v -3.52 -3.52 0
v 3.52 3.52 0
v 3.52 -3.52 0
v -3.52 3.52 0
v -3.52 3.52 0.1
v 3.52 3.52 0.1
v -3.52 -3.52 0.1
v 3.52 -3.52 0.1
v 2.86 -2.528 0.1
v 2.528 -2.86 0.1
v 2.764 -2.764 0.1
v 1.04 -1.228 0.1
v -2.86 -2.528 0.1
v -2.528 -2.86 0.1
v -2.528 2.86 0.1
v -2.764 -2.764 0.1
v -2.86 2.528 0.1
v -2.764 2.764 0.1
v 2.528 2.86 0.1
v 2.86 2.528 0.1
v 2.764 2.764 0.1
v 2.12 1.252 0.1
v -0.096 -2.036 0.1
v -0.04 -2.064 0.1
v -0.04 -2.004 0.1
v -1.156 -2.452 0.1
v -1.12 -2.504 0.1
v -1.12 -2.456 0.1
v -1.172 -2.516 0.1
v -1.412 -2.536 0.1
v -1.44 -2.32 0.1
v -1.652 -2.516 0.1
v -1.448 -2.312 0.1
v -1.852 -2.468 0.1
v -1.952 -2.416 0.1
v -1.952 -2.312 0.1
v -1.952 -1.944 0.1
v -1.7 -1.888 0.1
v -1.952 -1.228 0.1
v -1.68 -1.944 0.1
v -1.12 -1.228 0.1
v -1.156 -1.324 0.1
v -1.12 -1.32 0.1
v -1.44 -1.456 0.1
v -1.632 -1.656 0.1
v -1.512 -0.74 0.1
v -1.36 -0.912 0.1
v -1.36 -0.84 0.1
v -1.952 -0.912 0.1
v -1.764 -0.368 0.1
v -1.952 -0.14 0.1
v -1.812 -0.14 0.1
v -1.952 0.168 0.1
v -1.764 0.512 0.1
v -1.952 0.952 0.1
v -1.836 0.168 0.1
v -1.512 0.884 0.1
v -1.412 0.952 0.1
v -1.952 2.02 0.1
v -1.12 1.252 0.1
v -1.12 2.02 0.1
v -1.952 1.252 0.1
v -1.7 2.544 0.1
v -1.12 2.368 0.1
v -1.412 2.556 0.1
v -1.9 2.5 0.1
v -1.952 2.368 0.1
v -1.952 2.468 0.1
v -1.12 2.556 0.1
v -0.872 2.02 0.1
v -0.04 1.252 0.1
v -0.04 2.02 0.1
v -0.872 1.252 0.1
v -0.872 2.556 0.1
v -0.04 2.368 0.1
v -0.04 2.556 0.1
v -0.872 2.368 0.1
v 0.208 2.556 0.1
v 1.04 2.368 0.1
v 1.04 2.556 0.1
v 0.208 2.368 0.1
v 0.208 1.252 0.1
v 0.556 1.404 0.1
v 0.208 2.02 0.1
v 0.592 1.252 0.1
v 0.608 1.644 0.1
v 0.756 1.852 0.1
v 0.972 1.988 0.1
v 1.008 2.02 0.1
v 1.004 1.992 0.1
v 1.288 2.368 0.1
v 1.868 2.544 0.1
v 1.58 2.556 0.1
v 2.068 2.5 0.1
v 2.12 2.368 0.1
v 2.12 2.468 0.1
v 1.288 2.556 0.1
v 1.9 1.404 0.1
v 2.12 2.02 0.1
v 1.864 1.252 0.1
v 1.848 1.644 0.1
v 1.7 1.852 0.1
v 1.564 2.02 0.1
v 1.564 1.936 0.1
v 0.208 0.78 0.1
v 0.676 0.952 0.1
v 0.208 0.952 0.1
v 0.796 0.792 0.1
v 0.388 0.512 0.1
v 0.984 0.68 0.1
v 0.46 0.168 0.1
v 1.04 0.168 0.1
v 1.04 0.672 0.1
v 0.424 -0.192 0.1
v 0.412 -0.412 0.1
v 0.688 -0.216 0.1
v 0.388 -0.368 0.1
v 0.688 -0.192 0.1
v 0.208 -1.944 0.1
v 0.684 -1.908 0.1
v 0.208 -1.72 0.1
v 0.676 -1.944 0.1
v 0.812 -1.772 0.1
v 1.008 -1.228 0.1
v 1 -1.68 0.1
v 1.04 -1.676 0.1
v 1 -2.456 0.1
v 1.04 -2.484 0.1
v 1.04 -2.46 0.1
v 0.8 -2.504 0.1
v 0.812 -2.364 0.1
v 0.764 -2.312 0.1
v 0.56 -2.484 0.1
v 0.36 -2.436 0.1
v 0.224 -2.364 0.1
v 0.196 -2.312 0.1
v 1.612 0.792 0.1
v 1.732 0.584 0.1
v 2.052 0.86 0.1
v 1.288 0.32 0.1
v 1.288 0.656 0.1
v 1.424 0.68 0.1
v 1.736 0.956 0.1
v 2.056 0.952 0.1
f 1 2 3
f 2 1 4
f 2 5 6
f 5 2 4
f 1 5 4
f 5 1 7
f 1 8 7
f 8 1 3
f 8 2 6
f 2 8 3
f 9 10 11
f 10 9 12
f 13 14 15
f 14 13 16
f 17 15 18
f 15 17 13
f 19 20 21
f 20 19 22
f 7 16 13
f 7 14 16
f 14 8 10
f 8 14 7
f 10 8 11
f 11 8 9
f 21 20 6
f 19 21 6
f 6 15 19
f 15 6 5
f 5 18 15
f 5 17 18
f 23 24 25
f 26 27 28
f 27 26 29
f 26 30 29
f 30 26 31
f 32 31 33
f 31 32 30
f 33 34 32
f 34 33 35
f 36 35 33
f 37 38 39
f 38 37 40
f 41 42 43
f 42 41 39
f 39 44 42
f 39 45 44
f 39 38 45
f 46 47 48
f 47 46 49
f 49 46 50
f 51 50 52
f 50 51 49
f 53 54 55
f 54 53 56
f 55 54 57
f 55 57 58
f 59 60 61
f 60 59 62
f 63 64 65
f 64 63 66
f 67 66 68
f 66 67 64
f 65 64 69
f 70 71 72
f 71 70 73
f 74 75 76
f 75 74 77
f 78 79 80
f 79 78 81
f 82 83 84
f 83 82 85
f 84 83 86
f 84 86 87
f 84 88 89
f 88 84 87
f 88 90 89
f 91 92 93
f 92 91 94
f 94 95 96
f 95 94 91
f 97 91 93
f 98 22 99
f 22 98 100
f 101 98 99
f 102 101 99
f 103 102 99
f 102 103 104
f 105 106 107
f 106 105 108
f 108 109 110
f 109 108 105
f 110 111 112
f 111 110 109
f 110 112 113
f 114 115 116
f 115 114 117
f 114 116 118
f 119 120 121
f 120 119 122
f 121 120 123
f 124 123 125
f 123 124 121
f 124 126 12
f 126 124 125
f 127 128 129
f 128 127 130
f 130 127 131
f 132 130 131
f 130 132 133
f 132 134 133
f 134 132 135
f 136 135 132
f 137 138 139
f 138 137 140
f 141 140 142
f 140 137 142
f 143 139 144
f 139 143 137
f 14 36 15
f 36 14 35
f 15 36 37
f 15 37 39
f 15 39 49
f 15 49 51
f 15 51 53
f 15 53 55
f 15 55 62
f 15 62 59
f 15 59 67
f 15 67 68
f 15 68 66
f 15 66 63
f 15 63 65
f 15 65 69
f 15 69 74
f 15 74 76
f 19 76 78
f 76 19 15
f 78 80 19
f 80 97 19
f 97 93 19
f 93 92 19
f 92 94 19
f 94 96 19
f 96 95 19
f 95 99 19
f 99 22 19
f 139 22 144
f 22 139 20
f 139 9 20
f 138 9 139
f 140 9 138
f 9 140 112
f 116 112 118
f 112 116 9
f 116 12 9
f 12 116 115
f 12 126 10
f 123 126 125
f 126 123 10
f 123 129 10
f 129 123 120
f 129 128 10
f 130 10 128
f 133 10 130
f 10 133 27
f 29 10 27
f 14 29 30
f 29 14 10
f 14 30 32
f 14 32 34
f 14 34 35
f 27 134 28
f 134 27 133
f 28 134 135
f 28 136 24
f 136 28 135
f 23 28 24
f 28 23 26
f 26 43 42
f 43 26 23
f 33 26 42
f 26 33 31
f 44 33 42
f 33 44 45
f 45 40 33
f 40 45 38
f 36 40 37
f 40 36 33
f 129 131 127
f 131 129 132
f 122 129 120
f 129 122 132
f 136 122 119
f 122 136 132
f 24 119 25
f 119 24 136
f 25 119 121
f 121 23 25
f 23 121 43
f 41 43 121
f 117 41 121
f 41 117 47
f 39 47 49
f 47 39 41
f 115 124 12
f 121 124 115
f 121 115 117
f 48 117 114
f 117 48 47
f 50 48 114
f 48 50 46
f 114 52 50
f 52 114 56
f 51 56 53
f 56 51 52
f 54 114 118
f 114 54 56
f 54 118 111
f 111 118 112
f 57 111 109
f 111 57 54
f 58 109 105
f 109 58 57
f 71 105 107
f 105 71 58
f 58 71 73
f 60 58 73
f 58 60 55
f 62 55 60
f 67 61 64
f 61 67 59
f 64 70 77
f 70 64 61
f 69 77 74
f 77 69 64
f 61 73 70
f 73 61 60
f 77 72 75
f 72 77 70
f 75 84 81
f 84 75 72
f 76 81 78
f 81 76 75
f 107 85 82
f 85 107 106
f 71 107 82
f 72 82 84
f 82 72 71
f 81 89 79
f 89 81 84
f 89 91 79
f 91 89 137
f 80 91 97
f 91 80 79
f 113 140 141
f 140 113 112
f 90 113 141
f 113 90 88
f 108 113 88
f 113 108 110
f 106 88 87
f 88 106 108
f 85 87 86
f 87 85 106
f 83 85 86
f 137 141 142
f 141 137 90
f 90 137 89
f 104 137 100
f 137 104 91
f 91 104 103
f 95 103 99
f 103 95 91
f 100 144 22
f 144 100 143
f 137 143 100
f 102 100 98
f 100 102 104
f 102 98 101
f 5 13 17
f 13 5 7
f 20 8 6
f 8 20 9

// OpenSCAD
// file: ../p/box5-12.scad
use <../lib.scad>
function ldraw_lib__box5_12() = [
// 0 Box with 5 Faces without Any Edges
// 0 Name: box5-12.dat
// 0 Author: Chris Dee [cwdee]
// 0 !LDRAW_ORG Primitive UPDATE 2009-02
// 0 !LICENSE Licensed under CC BY 4.0 : see CAreadme.txt
// 
// 0 BFC CERTIFY CCW
  [0,"BFC","CERTIFY"],
  [0,"BFC","CCW"],
// 
// 0 !HISTORY 2009-09-03 [PTadmin] Official Update 2009-02
// 
// 
// 4 16 1 1 1 1 1 -1 -1 1 -1 -1 1 1
  [4,16,1,1,1,1,1,-1,-1,1,-1,-1,1,1],
// 4 16 -1 0 1 1 0 1 1 1 1 -1 1 1
  [4,16,-1,0,1,1,0,1,1,1,1,-1,1,1],
// 4 16 -1 0 -1 -1 0 1 -1 1 1 -1 1 -1
  [4,16,-1,0,-1,-1,0,1,-1,1,1,-1,1,-1],
// 4 16 1 0 -1 -1 0 -1 -1 1 -1 1 1 -1
  [4,16,1,0,-1,-1,0,-1,-1,1,-1,1,1,-1],
// 4 16 1 0 1 1 0 -1 1 1 -1 1 1 1
  [4,16,1,0,1,1,0,-1,1,1,-1,1,1,1],
// 0
];
module ldraw_lib__box5_12(step=0, col=false, unit=2/5, alt=false, line=0.2, solid=!$preview)
    makepoly(ldraw_lib__box5_12(), step=step, col=col, unit=unit, alt=alt, line=line, solid=solid);
ldraw_lib__box5_12(line=0.2);
// main file
use <../lib.scad>
use <../p/box5-12.scad>
function ldraw_lib__168365d() = [
// 0 Sticker  0.9 x  0.9 with Light Grey Stripes on White Background with Reflection Areas with Black Border
// 0 Name: 168365d.dat
// 0 Author: Max Martin Richter [MMR1988]
// 0 !LDRAW_ORG Part UPDATE 2019-02
// 0 !LICENSE Licensed under CC BY 4.0 : see CAreadme.txt
// 
// 0 BFC CERTIFY CCW
  [0,"BFC","CERTIFY"],
  [0,"BFC","CCW"],
// 
// 0 !KEYWORDS headlight, Set 8858-1
// 
// 0 !HISTORY 2019-09-09 [PTadmin] Official Update 2019-02
// 
// 
// 1 16 0 -0.25 0 8.8 0 0 0 0.25 0 0 0 8.8 box5-12.dat
  [1,16,0,-0.25,0,8.8,0,0,0,0.25,0,0,0,8.8, ldraw_lib__box5_12()],
// 
// 4 15 6.32 -0.25 -7.15 6.91 -0.25 -6.91 7.15 -0.25 -6.32 2.6 -0.25 -3.07
  [4,15,6.32,-0.25,-7.15,6.91,-0.25,-6.91,7.15,-0.25,-6.32,2.6,-0.25,-3.07],
// 4 15 -7.15 -0.25 -6.32 -6.91 -0.25 -6.91 -6.32 -0.25 -7.15 -6.32 -0.25 7.15
  [4,15,-7.15,-0.25,-6.32,-6.91,-0.25,-6.91,-6.32,-0.25,-7.15,-6.32,-0.25,7.15],
// 4 15 -6.32 -0.25 7.15 -6.91 -0.25 6.91 -7.15 -0.25 6.32 -7.15 -0.25 -6.32
  [4,15,-6.32,-0.25,7.15,-6.91,-0.25,6.91,-7.15,-0.25,6.32,-7.15,-0.25,-6.32],
// 4 15 7.15 -0.25 6.32 6.91 -0.25 6.91 6.32 -0.25 7.15 5.3 -0.25 3.13
  [4,15,7.15,-0.25,6.32,6.91,-0.25,6.91,6.32,-0.25,7.15,5.3,-0.25,3.13],
// 3 0 -8.8 -0.25 -8.8 -6.91 -0.25 -6.91 -7.15 -0.25 -6.32
  [3,0,-8.8,-0.25,-8.8,-6.91,-0.25,-6.91,-7.15,-0.25,-6.32],
// 3 0 -8.8 -0.25 -8.8 -6.32 -0.25 -7.15 -6.91 -0.25 -6.91
  [3,0,-8.8,-0.25,-8.8,-6.32,-0.25,-7.15,-6.91,-0.25,-6.91],
// 4 0 -6.32 -0.25 -7.15 -8.8 -0.25 -8.8 8.8 -0.25 -8.8 6.32 -0.25 -7.15
  [4,0,-6.32,-0.25,-7.15,-8.8,-0.25,-8.8,8.8,-0.25,-8.8,6.32,-0.25,-7.15],
// 3 0 6.32 -0.25 -7.15 8.8 -0.25 -8.8 6.91 -0.25 -6.91
  [3,0,6.32,-0.25,-7.15,8.8,-0.25,-8.8,6.91,-0.25,-6.91],
// 3 0 6.91 -0.25 -6.91 8.8 -0.25 -8.8 7.15 -0.25 -6.32
  [3,0,6.91,-0.25,-6.91,8.8,-0.25,-8.8,7.15,-0.25,-6.32],
// 3 0 6.91 -0.25 6.91 7.15 -0.25 6.32 8.8 -0.25 8.8
  [3,0,6.91,-0.25,6.91,7.15,-0.25,6.32,8.8,-0.25,8.8],
// 3 0 6.32 -0.25 7.15 6.91 -0.25 6.91 8.8 -0.25 8.8
  [3,0,6.32,-0.25,7.15,6.91,-0.25,6.91,8.8,-0.25,8.8],
// 4 0 -6.32 -0.25 7.15 6.32 -0.25 7.15 8.8 -0.25 8.8 -8.8 -0.25 8.8
  [4,0,-6.32,-0.25,7.15,6.32,-0.25,7.15,8.8,-0.25,8.8,-8.8,-0.25,8.8],
// 3 0 -8.8 -0.25 8.8 -6.91 -0.25 6.91 -6.32 -0.25 7.15
  [3,0,-8.8,-0.25,8.8,-6.91,-0.25,6.91,-6.32,-0.25,7.15],
// 3 0 -8.8 -0.25 8.8 -7.15 -0.25 6.32 -6.91 -0.25 6.91
  [3,0,-8.8,-0.25,8.8,-7.15,-0.25,6.32,-6.91,-0.25,6.91],
// 3 7 -0.24 -0.25 -5.09 -0.1 -0.25 -5.16 -0.1 -0.25 -5.01
  [3,7,-0.24,-0.25,-5.09,-0.1,-0.25,-5.16,-0.1,-0.25,-5.01],
// 4 7 -2.8 -0.25 -6.26 -2.8 -0.25 -6.14 -2.89 -0.25 -6.13 -2.93 -0.25 -6.29
  [4,7,-2.8,-0.25,-6.26,-2.8,-0.25,-6.14,-2.89,-0.25,-6.13,-2.93,-0.25,-6.29],
// 4 7 -2.93 -0.25 -6.29 -2.89 -0.25 -6.13 -3.6 -0.25 -5.8 -3.53 -0.25 -6.34
  [4,7,-2.93,-0.25,-6.29,-2.89,-0.25,-6.13,-3.6,-0.25,-5.8,-3.53,-0.25,-6.34],
// 4 7 -4.13 -0.25 -6.29 -3.53 -0.25 -6.34 -3.6 -0.25 -5.8 -3.62 -0.25 -5.78
  [4,7,-4.13,-0.25,-6.29,-3.53,-0.25,-6.34,-3.6,-0.25,-5.8,-3.62,-0.25,-5.78],
// 4 7 -4.63 -0.25 -6.17 -4.13 -0.25 -6.29 -3.62 -0.25 -5.78 -4.88 -0.25 -6.04
  [4,7,-4.63,-0.25,-6.17,-4.13,-0.25,-6.29,-3.62,-0.25,-5.78,-4.88,-0.25,-6.04],
// 3 7 -4.88 -0.25 -5.78 -4.88 -0.25 -6.04 -3.62 -0.25 -5.78
  [3,7,-4.88,-0.25,-5.78,-4.88,-0.25,-6.04,-3.62,-0.25,-5.78],
// 4 7 -4.88 -0.25 -3.07 -4.88 -0.25 -4.86 -4.2 -0.25 -4.86 -4.25 -0.25 -4.72
  [4,7,-4.88,-0.25,-3.07,-4.88,-0.25,-4.86,-4.2,-0.25,-4.86,-4.25,-0.25,-4.72],
// 4 7 -2.8 -0.25 -3.3 -2.8 -0.25 -3.07 -4.88 -0.25 -3.07 -2.89 -0.25 -3.31
  [4,7,-2.8,-0.25,-3.3,-2.8,-0.25,-3.07,-4.88,-0.25,-3.07,-2.89,-0.25,-3.31],
// 3 7 -4.88 -0.25 -3.07 -3.6 -0.25 -3.64 -2.89 -0.25 -3.31
  [3,7,-4.88,-0.25,-3.07,-3.6,-0.25,-3.64,-2.89,-0.25,-3.31],
// 3 7 -4.88 -0.25 -3.07 -4.08 -0.25 -4.14 -3.6 -0.25 -3.64
  [3,7,-4.88,-0.25,-3.07,-4.08,-0.25,-4.14,-3.6,-0.25,-3.64],
// 3 7 -4.88 -0.25 -3.07 -4.25 -0.25 -4.72 -4.08 -0.25 -4.14
  [3,7,-4.88,-0.25,-3.07,-4.25,-0.25,-4.72,-4.08,-0.25,-4.14],
// 4 7 -4.88 -0.25 -2.28 -3.4 -0.25 -2.28 -3.4 -0.25 -2.1 -3.78 -0.25 -1.85
  [4,7,-4.88,-0.25,-2.28,-3.4,-0.25,-2.28,-3.4,-0.25,-2.1,-3.78,-0.25,-1.85],
// 3 7 -4.88 -0.25 -2.28 -3.78 -0.25 -1.85 -4.41 -0.25 -0.92
  [3,7,-4.88,-0.25,-2.28,-3.78,-0.25,-1.85,-4.41,-0.25,-0.92],
// 4 7 -4.88 -0.25 -2.28 -4.41 -0.25 -0.92 -4.53 -0.25 -0.35 -4.88 -0.25 -0.35
  [4,7,-4.88,-0.25,-2.28,-4.41,-0.25,-0.92,-4.53,-0.25,-0.35,-4.88,-0.25,-0.35],
// 4 7 -4.88 -0.25 0.42 -4.59 -0.25 0.42 -4.41 -0.25 1.28 -4.88 -0.25 2.38
  [4,7,-4.88,-0.25,0.42,-4.59,-0.25,0.42,-4.41,-0.25,1.28,-4.88,-0.25,2.38],
// 3 7 -4.88 -0.25 2.38 -4.41 -0.25 1.28 -3.78 -0.25 2.21
  [3,7,-4.88,-0.25,2.38,-4.41,-0.25,1.28,-3.78,-0.25,2.21],
// 3 7 -4.88 -0.25 2.38 -3.78 -0.25 2.21 -3.53 -0.25 2.38
  [3,7,-4.88,-0.25,2.38,-3.78,-0.25,2.21,-3.53,-0.25,2.38],
// 4 7 -2.8 -0.25 5.05 -4.88 -0.25 5.05 -4.88 -0.25 3.13 -2.8 -0.25 3.13
  [4,7,-2.8,-0.25,5.05,-4.88,-0.25,5.05,-4.88,-0.25,3.13,-2.8,-0.25,3.13],
// 4 7 -2.8 -0.25 5.92 -3.53 -0.25 6.39 -4.25 -0.25 6.36 -4.75 -0.25 6.25
  [4,7,-2.8,-0.25,5.92,-3.53,-0.25,6.39,-4.25,-0.25,6.36,-4.75,-0.25,6.25],
// 4 7 -2.8 -0.25 5.92 -4.75 -0.25 6.25 -4.88 -0.25 6.17 -4.88 -0.25 5.92
  [4,7,-2.8,-0.25,5.92,-4.75,-0.25,6.25,-4.88,-0.25,6.17,-4.88,-0.25,5.92],
// 3 7 -3.53 -0.25 6.39 -2.8 -0.25 5.92 -2.8 -0.25 6.39
  [3,7,-3.53,-0.25,6.39,-2.8,-0.25,5.92,-2.8,-0.25,6.39],
// 4 7 -2.18 -0.25 3.13 -0.1 -0.25 3.13 -0.1 -0.25 5.05 -2.18 -0.25 5.05
  [4,7,-2.18,-0.25,3.13,-0.1,-0.25,3.13,-0.1,-0.25,5.05,-2.18,-0.25,5.05],
// 4 7 -2.18 -0.25 5.92 -0.1 -0.25 5.92 -0.1 -0.25 6.39 -2.18 -0.25 6.39
  [4,7,-2.18,-0.25,5.92,-0.1,-0.25,5.92,-0.1,-0.25,6.39,-2.18,-0.25,6.39],
// 4 7 2.6 -0.25 6.39 0.52 -0.25 6.39 0.52 -0.25 5.92 2.6 -0.25 5.92
  [4,7,2.6,-0.25,6.39,0.52,-0.25,6.39,0.52,-0.25,5.92,2.6,-0.25,5.92],
// 4 7 0.52 -0.25 3.13 1.48 -0.25 3.13 1.39 -0.25 3.51 0.52 -0.25 5.05
  [4,7,0.52,-0.25,3.13,1.48,-0.25,3.13,1.39,-0.25,3.51,0.52,-0.25,5.05],
// 3 7 0.52 -0.25 5.05 1.39 -0.25 3.51 1.52 -0.25 4.11
  [3,7,0.52,-0.25,5.05,1.39,-0.25,3.51,1.52,-0.25,4.11],
// 3 7 0.52 -0.25 5.05 1.52 -0.25 4.11 1.89 -0.25 4.63
  [3,7,0.52,-0.25,5.05,1.52,-0.25,4.11,1.89,-0.25,4.63],
// 4 7 0.52 -0.25 5.05 1.89 -0.25 4.63 2.43 -0.25 4.97 2.52 -0.25 5.05
  [4,7,0.52,-0.25,5.05,1.89,-0.25,4.63,2.43,-0.25,4.97,2.52,-0.25,5.05],
// 3 7 2.43 -0.25 4.97 2.51 -0.25 4.98 2.52 -0.25 5.05
  [3,7,2.43,-0.25,4.97,2.51,-0.25,4.98,2.52,-0.25,5.05],
// 4 7 4.67 -0.25 6.36 3.95 -0.25 6.39 3.22 -0.25 5.92 5.17 -0.25 6.25
  [4,7,4.67,-0.25,6.36,3.95,-0.25,6.39,3.22,-0.25,5.92,5.17,-0.25,6.25],
// 4 7 5.3 -0.25 6.17 5.17 -0.25 6.25 3.22 -0.25 5.92 5.3 -0.25 5.92
  [4,7,5.3,-0.25,6.17,5.17,-0.25,6.25,3.22,-0.25,5.92,5.3,-0.25,5.92],
// 3 7 3.22 -0.25 6.39 3.22 -0.25 5.92 3.95 -0.25 6.39
  [3,7,3.22,-0.25,6.39,3.22,-0.25,5.92,3.95,-0.25,6.39],
// 4 7 4.75 -0.25 3.51 4.66 -0.25 3.13 5.3 -0.25 3.13 5.3 -0.25 5.05
  [4,7,4.75,-0.25,3.51,4.66,-0.25,3.13,5.3,-0.25,3.13,5.3,-0.25,5.05],
// 3 7 4.62 -0.25 4.11 4.75 -0.25 3.51 5.3 -0.25 5.05
  [3,7,4.62,-0.25,4.11,4.75,-0.25,3.51,5.3,-0.25,5.05],
// 3 7 4.25 -0.25 4.63 4.62 -0.25 4.11 5.3 -0.25 5.05
  [3,7,4.25,-0.25,4.63,4.62,-0.25,4.11,5.3,-0.25,5.05],
// 4 7 3.91 -0.25 4.84 4.25 -0.25 4.63 5.3 -0.25 5.05 3.91 -0.25 5.05
  [4,7,3.91,-0.25,4.84,4.25,-0.25,4.63,5.3,-0.25,5.05,3.91,-0.25,5.05],
// 4 7 1.99 -0.25 1.98 1.69 -0.25 2.38 0.52 -0.25 2.38 0.52 -0.25 1.95
  [4,7,1.99,-0.25,1.98,1.69,-0.25,2.38,0.52,-0.25,2.38,0.52,-0.25,1.95],
// 4 7 1.99 -0.25 1.98 0.52 -0.25 1.95 0.97 -0.25 1.28 2.46 -0.25 1.7
  [4,7,1.99,-0.25,1.98,0.52,-0.25,1.95,0.97,-0.25,1.28,2.46,-0.25,1.7],
// 4 7 2.46 -0.25 1.7 0.97 -0.25 1.28 1.15 -0.25 0.42 2.6 -0.25 0.42
  [4,7,2.46,-0.25,1.7,0.97,-0.25,1.28,1.15,-0.25,0.42,2.6,-0.25,0.42],
// 3 7 2.46 -0.25 1.7 2.6 -0.25 0.42 2.6 -0.25 1.68
  [3,7,2.46,-0.25,1.7,2.6,-0.25,0.42,2.6,-0.25,1.68],
// 4 7 0.97 -0.25 -0.92 1.03 -0.25 -1.03 1.72 -0.25 -0.54 1.06 -0.25 -0.48
  [4,7,0.97,-0.25,-0.92,1.03,-0.25,-1.03,1.72,-0.25,-0.54,1.06,-0.25,-0.48],
// 3 7 1.06 -0.25 -0.48 1.72 -0.25 -0.54 1.72 -0.25 -0.48
  [3,7,1.06,-0.25,-0.48,1.72,-0.25,-0.54,1.72,-0.25,-0.48],
// 4 7 0.52 -0.25 -4.3 0.52 -0.25 -4.86 1.69 -0.25 -4.86 1.71 -0.25 -4.77
  [4,7,0.52,-0.25,-4.3,0.52,-0.25,-4.86,1.69,-0.25,-4.86,1.71,-0.25,-4.77],
// 3 7 0.52 -0.25 -4.3 1.71 -0.25 -4.77 2.03 -0.25 -4.43
  [3,7,0.52,-0.25,-4.3,1.71,-0.25,-4.77,2.03,-0.25,-4.43],
// 4 7 0.52 -0.25 -4.3 2.03 -0.25 -4.43 2.5 -0.25 -4.2 2.52 -0.25 -3.07
  [4,7,0.52,-0.25,-4.3,2.03,-0.25,-4.43,2.5,-0.25,-4.2,2.52,-0.25,-3.07],
// 4 7 2.6 -0.25 -3.07 2.52 -0.25 -3.07 2.5 -0.25 -4.2 2.6 -0.25 -4.19
  [4,7,2.6,-0.25,-3.07,2.52,-0.25,-3.07,2.5,-0.25,-4.2,2.6,-0.25,-4.19],
// 4 7 2 -0.25 -6.26 2.6 -0.25 -6.21 2.6 -0.25 -6.15 2.5 -0.25 -6.14
  [4,7,2,-0.25,-6.26,2.6,-0.25,-6.21,2.6,-0.25,-6.15,2.5,-0.25,-6.14],
// 3 7 2 -0.25 -6.26 2.5 -0.25 -6.14 2.03 -0.25 -5.91
  [3,7,2,-0.25,-6.26,2.5,-0.25,-6.14,2.03,-0.25,-5.91],
// 4 7 2 -0.25 -6.26 2.03 -0.25 -5.91 1.91 -0.25 -5.78 1.4 -0.25 -6.21
  [4,7,2,-0.25,-6.26,2.03,-0.25,-5.91,1.91,-0.25,-5.78,1.4,-0.25,-6.21],
// 4 7 0.9 -0.25 -6.09 1.4 -0.25 -6.21 1.91 -0.25 -5.78 0.56 -0.25 -5.91
  [4,7,0.9,-0.25,-6.09,1.4,-0.25,-6.21,1.91,-0.25,-5.78,0.56,-0.25,-5.91],
// 3 7 0.49 -0.25 -5.78 0.56 -0.25 -5.91 1.91 -0.25 -5.78
  [3,7,0.49,-0.25,-5.78,0.56,-0.25,-5.91,1.91,-0.25,-5.78],
// 4 7 3.22 -0.25 0.8 4.33 -0.25 1.46 5.13 -0.25 2.15 4.03 -0.25 1.98
  [4,7,3.22,-0.25,0.8,4.33,-0.25,1.46,5.13,-0.25,2.15,4.03,-0.25,1.98],
// 3 7 3.22 -0.25 1.64 3.22 -0.25 0.8 3.56 -0.25 1.7
  [3,7,3.22,-0.25,1.64,3.22,-0.25,0.8,3.56,-0.25,1.7],
// 3 7 3.22 -0.25 0.8 4.03 -0.25 1.98 3.56 -0.25 1.7
  [3,7,3.22,-0.25,0.8,4.03,-0.25,1.98,3.56,-0.25,1.7],
// 4 7 4.03 -0.25 1.98 5.13 -0.25 2.15 5.14 -0.25 2.38 4.34 -0.25 2.39
  [4,7,4.03,-0.25,1.98,5.13,-0.25,2.15,5.14,-0.25,2.38,4.34,-0.25,2.39],
// 4 15 -6.32 -0.25 7.15 -6.32 -0.25 -7.15 -4.88 -0.25 -6.04 -4.88 -0.25 -5.78
  [4,15,-6.32,-0.25,7.15,-6.32,-0.25,-7.15,-4.88,-0.25,-6.04,-4.88,-0.25,-5.78],
// 3 15 -6.32 -0.25 7.15 -4.88 -0.25 -5.78 -4.88 -0.25 -4.86
  [3,15,-6.32,-0.25,7.15,-4.88,-0.25,-5.78,-4.88,-0.25,-4.86],
// 3 15 -6.32 -0.25 7.15 -4.88 -0.25 -4.86 -4.88 -0.25 -3.07
  [3,15,-6.32,-0.25,7.15,-4.88,-0.25,-4.86,-4.88,-0.25,-3.07],
// 3 15 -6.32 -0.25 7.15 -4.88 -0.25 -3.07 -4.88 -0.25 -2.28
  [3,15,-6.32,-0.25,7.15,-4.88,-0.25,-3.07,-4.88,-0.25,-2.28],
// 3 15 -6.32 -0.25 7.15 -4.88 -0.25 -2.28 -4.88 -0.25 -0.35
  [3,15,-6.32,-0.25,7.15,-4.88,-0.25,-2.28,-4.88,-0.25,-0.35],
// 3 15 -6.32 -0.25 7.15 -4.88 -0.25 -0.35 -4.88 -0.25 0.42
  [3,15,-6.32,-0.25,7.15,-4.88,-0.25,-0.35,-4.88,-0.25,0.42],
// 3 15 -6.32 -0.25 7.15 -4.88 -0.25 0.42 -4.88 -0.25 2.38
  [3,15,-6.32,-0.25,7.15,-4.88,-0.25,0.42,-4.88,-0.25,2.38],
// 3 15 -6.32 -0.25 7.15 -4.88 -0.25 2.38 -4.88 -0.25 3.13
  [3,15,-6.32,-0.25,7.15,-4.88,-0.25,2.38,-4.88,-0.25,3.13],
// 3 15 -6.32 -0.25 7.15 -4.88 -0.25 3.13 -4.88 -0.25 5.05
  [3,15,-6.32,-0.25,7.15,-4.88,-0.25,3.13,-4.88,-0.25,5.05],
// 3 15 -6.32 -0.25 7.15 -4.88 -0.25 5.05 -4.88 -0.25 5.92
  [3,15,-6.32,-0.25,7.15,-4.88,-0.25,5.05,-4.88,-0.25,5.92],
// 3 15 -6.32 -0.25 7.15 -4.88 -0.25 5.92 -4.88 -0.25 6.17
  [3,15,-6.32,-0.25,7.15,-4.88,-0.25,5.92,-4.88,-0.25,6.17],
// 3 15 -6.32 -0.25 7.15 -4.88 -0.25 6.17 -4.75 -0.25 6.25
  [3,15,-6.32,-0.25,7.15,-4.88,-0.25,6.17,-4.75,-0.25,6.25],
// 3 15 -6.32 -0.25 7.15 -4.75 -0.25 6.25 -4.25 -0.25 6.36
  [3,15,-6.32,-0.25,7.15,-4.75,-0.25,6.25,-4.25,-0.25,6.36],
// 3 15 -6.32 -0.25 7.15 -4.25 -0.25 6.36 -3.53 -0.25 6.39
  [3,15,-6.32,-0.25,7.15,-4.25,-0.25,6.36,-3.53,-0.25,6.39],
// 3 15 -6.32 -0.25 7.15 -3.53 -0.25 6.39 -2.8 -0.25 6.39
  [3,15,-6.32,-0.25,7.15,-3.53,-0.25,6.39,-2.8,-0.25,6.39],
// 3 15 -6.32 -0.25 7.15 -2.8 -0.25 6.39 -2.18 -0.25 6.39
  [3,15,-6.32,-0.25,7.15,-2.8,-0.25,6.39,-2.18,-0.25,6.39],
// 3 15 -6.32 -0.25 7.15 -2.18 -0.25 6.39 -0.1 -0.25 6.39
  [3,15,-6.32,-0.25,7.15,-2.18,-0.25,6.39,-0.1,-0.25,6.39],
// 4 15 -6.32 -0.25 7.15 -0.1 -0.25 6.39 0.52 -0.25 6.39 6.32 -0.25 7.15
  [4,15,-6.32,-0.25,7.15,-0.1,-0.25,6.39,0.52,-0.25,6.39,6.32,-0.25,7.15],
// 3 15 0.52 -0.25 6.39 2.6 -0.25 6.39 6.32 -0.25 7.15
  [3,15,0.52,-0.25,6.39,2.6,-0.25,6.39,6.32,-0.25,7.15],
// 3 15 2.6 -0.25 6.39 3.22 -0.25 6.39 6.32 -0.25 7.15
  [3,15,2.6,-0.25,6.39,3.22,-0.25,6.39,6.32,-0.25,7.15],
// 3 15 3.22 -0.25 6.39 3.95 -0.25 6.39 6.32 -0.25 7.15
  [3,15,3.22,-0.25,6.39,3.95,-0.25,6.39,6.32,-0.25,7.15],
// 3 15 3.95 -0.25 6.39 4.67 -0.25 6.36 6.32 -0.25 7.15
  [3,15,3.95,-0.25,6.39,4.67,-0.25,6.36,6.32,-0.25,7.15],
// 3 15 4.67 -0.25 6.36 5.17 -0.25 6.25 6.32 -0.25 7.15
  [3,15,4.67,-0.25,6.36,5.17,-0.25,6.25,6.32,-0.25,7.15],
// 3 15 5.17 -0.25 6.25 5.3 -0.25 6.17 6.32 -0.25 7.15
  [3,15,5.17,-0.25,6.25,5.3,-0.25,6.17,6.32,-0.25,7.15],
// 3 15 5.3 -0.25 6.17 5.3 -0.25 5.92 6.32 -0.25 7.15
  [3,15,5.3,-0.25,6.17,5.3,-0.25,5.92,6.32,-0.25,7.15],
// 3 15 5.3 -0.25 5.92 5.3 -0.25 5.05 6.32 -0.25 7.15
  [3,15,5.3,-0.25,5.92,5.3,-0.25,5.05,6.32,-0.25,7.15],
// 3 15 5.3 -0.25 5.05 5.3 -0.25 3.13 6.32 -0.25 7.15
  [3,15,5.3,-0.25,5.05,5.3,-0.25,3.13,6.32,-0.25,7.15],
// 4 15 7.15 -0.25 6.32 5.3 -0.25 3.13 5.14 -0.25 2.38 5.13 -0.25 2.15
  [4,15,7.15,-0.25,6.32,5.3,-0.25,3.13,5.14,-0.25,2.38,5.13,-0.25,2.15],
// 3 15 5.13 -0.25 2.15 7.15 -0.25 -6.32 7.15 -0.25 6.32
  [3,15,5.13,-0.25,2.15,7.15,-0.25,-6.32,7.15,-0.25,6.32],
// 3 15 4.33 -0.25 1.46 7.15 -0.25 -6.32 5.13 -0.25 2.15
  [3,15,4.33,-0.25,1.46,7.15,-0.25,-6.32,5.13,-0.25,2.15],
// 4 15 7.15 -0.25 -6.32 4.33 -0.25 1.46 3.22 -0.25 0.8 2.6 -0.25 0.42
  [4,15,7.15,-0.25,-6.32,4.33,-0.25,1.46,3.22,-0.25,0.8,2.6,-0.25,0.42],
// 4 15 7.15 -0.25 -6.32 2.6 -0.25 0.42 1.72 -0.25 -0.48 1.72 -0.25 -0.54
  [4,15,7.15,-0.25,-6.32,2.6,-0.25,0.42,1.72,-0.25,-0.48,1.72,-0.25,-0.54],
// 4 15 7.15 -0.25 -6.32 1.72 -0.25 -0.54 1.03 -0.25 -1.03 2.6 -0.25 -3.07
  [4,15,7.15,-0.25,-6.32,1.72,-0.25,-0.54,1.03,-0.25,-1.03,2.6,-0.25,-3.07],
// 3 15 2.6 -0.25 -3.07 2.6 -0.25 -4.19 6.32 -0.25 -7.15
  [3,15,2.6,-0.25,-3.07,2.6,-0.25,-4.19,6.32,-0.25,-7.15],
// 4 15 6.32 -0.25 -7.15 2.6 -0.25 -4.19 2.5 -0.25 -4.2 2.03 -0.25 -4.43
  [4,15,6.32,-0.25,-7.15,2.6,-0.25,-4.19,2.5,-0.25,-4.2,2.03,-0.25,-4.43],
// 4 15 6.32 -0.25 -7.15 2.03 -0.25 -4.43 1.71 -0.25 -4.77 2.6 -0.25 -6.15
  [4,15,6.32,-0.25,-7.15,2.03,-0.25,-4.43,1.71,-0.25,-4.77,2.6,-0.25,-6.15],
// 3 15 2.6 -0.25 -6.15 2.6 -0.25 -6.21 6.32 -0.25 -7.15
  [3,15,2.6,-0.25,-6.15,2.6,-0.25,-6.21,6.32,-0.25,-7.15],
// 3 15 2 -0.25 -6.26 6.32 -0.25 -7.15 2.6 -0.25 -6.21
  [3,15,2,-0.25,-6.26,6.32,-0.25,-7.15,2.6,-0.25,-6.21],
// 4 15 6.32 -0.25 -7.15 2 -0.25 -6.26 1.4 -0.25 -6.21 -2.8 -0.25 -6.26
  [4,15,6.32,-0.25,-7.15,2,-0.25,-6.26,1.4,-0.25,-6.21,-2.8,-0.25,-6.26],
// 3 15 -2.93 -0.25 -6.29 6.32 -0.25 -7.15 -2.8 -0.25 -6.26
  [3,15,-2.93,-0.25,-6.29,6.32,-0.25,-7.15,-2.8,-0.25,-6.26],
// 4 15 6.32 -0.25 -7.15 -2.93 -0.25 -6.29 -3.53 -0.25 -6.34 -6.32 -0.25 -7.15
  [4,15,6.32,-0.25,-7.15,-2.93,-0.25,-6.29,-3.53,-0.25,-6.34,-6.32,-0.25,-7.15],
// 3 15 -6.32 -0.25 -7.15 -3.53 -0.25 -6.34 -4.13 -0.25 -6.29
  [3,15,-6.32,-0.25,-7.15,-3.53,-0.25,-6.34,-4.13,-0.25,-6.29],
// 3 15 -6.32 -0.25 -7.15 -4.13 -0.25 -6.29 -4.63 -0.25 -6.17
  [3,15,-6.32,-0.25,-7.15,-4.13,-0.25,-6.29,-4.63,-0.25,-6.17],
// 3 15 -6.32 -0.25 -7.15 -4.63 -0.25 -6.17 -4.88 -0.25 -6.04
  [3,15,-6.32,-0.25,-7.15,-4.63,-0.25,-6.17,-4.88,-0.25,-6.04],
// 4 15 -2.8 -0.25 -6.14 -2.8 -0.25 -6.26 1.4 -0.25 -6.21 0.9 -0.25 -6.09
  [4,15,-2.8,-0.25,-6.14,-2.8,-0.25,-6.26,1.4,-0.25,-6.21,0.9,-0.25,-6.09],
// 3 15 -2.8 -0.25 -6.14 0.9 -0.25 -6.09 0.56 -0.25 -5.91
  [3,15,-2.8,-0.25,-6.14,0.9,-0.25,-6.09,0.56,-0.25,-5.91],
// 4 15 -2.8 -0.25 -6.14 0.56 -0.25 -5.91 0.49 -0.25 -5.78 -0.1 -0.25 -5.16
  [4,15,-2.8,-0.25,-6.14,0.56,-0.25,-5.91,0.49,-0.25,-5.78,-0.1,-0.25,-5.16],
// 4 15 -2.8 -0.25 -6.14 -0.1 -0.25 -5.16 -0.24 -0.25 -5.09 -2.89 -0.25 -6.13
  [4,15,-2.8,-0.25,-6.14,-0.1,-0.25,-5.16,-0.24,-0.25,-5.09,-2.89,-0.25,-6.13],
// 4 15 -2.89 -0.25 -6.13 -0.24 -0.25 -5.09 -2.8 -0.25 -3.3 -2.89 -0.25 -3.31
  [4,15,-2.89,-0.25,-6.13,-0.24,-0.25,-5.09,-2.8,-0.25,-3.3,-2.89,-0.25,-3.31],
// 4 15 -3.6 -0.25 -5.8 -2.89 -0.25 -6.13 -2.89 -0.25 -3.31 -3.62 -0.25 -5.78
  [4,15,-3.6,-0.25,-5.8,-2.89,-0.25,-6.13,-2.89,-0.25,-3.31,-3.62,-0.25,-5.78],
// 4 15 -3.62 -0.25 -5.78 -2.89 -0.25 -3.31 -3.6 -0.25 -3.64 -4.08 -0.25 -4.14
  [4,15,-3.62,-0.25,-5.78,-2.89,-0.25,-3.31,-3.6,-0.25,-3.64,-4.08,-0.25,-4.14],
// 4 15 -3.62 -0.25 -5.78 -4.08 -0.25 -4.14 -4.25 -0.25 -4.72 -4.2 -0.25 -4.86
  [4,15,-3.62,-0.25,-5.78,-4.08,-0.25,-4.14,-4.25,-0.25,-4.72,-4.2,-0.25,-4.86],
// 4 15 -3.62 -0.25 -5.78 -4.2 -0.25 -4.86 -4.88 -0.25 -4.86 -4.88 -0.25 -5.78
  [4,15,-3.62,-0.25,-5.78,-4.2,-0.25,-4.86,-4.88,-0.25,-4.86,-4.88,-0.25,-5.78],
// 4 15 2.03 -0.25 -5.91 2.5 -0.25 -6.14 2.6 -0.25 -6.15 1.91 -0.25 -5.78
  [4,15,2.03,-0.25,-5.91,2.5,-0.25,-6.14,2.6,-0.25,-6.15,1.91,-0.25,-5.78],
// 4 15 1.91 -0.25 -5.78 2.6 -0.25 -6.15 1.71 -0.25 -4.77 1.69 -0.25 -4.86
  [4,15,1.91,-0.25,-5.78,2.6,-0.25,-6.15,1.71,-0.25,-4.77,1.69,-0.25,-4.86],
// 4 15 1.91 -0.25 -5.78 1.69 -0.25 -4.86 0.52 -0.25 -4.86 0.49 -0.25 -5.78
  [4,15,1.91,-0.25,-5.78,1.69,-0.25,-4.86,0.52,-0.25,-4.86,0.49,-0.25,-5.78],
// 4 15 -0.1 -0.25 -5.16 0.49 -0.25 -5.78 0.52 -0.25 -4.86 -0.1 -0.25 -5.01
  [4,15,-0.1,-0.25,-5.16,0.49,-0.25,-5.78,0.52,-0.25,-4.86,-0.1,-0.25,-5.01],
// 3 15 -0.1 -0.25 -5.01 0.52 -0.25 -4.86 0.52 -0.25 -4.3
  [3,15,-0.1,-0.25,-5.01,0.52,-0.25,-4.86,0.52,-0.25,-4.3],
// 4 15 -0.24 -0.25 -5.09 -0.1 -0.25 -5.01 0.52 -0.25 -4.3 -2.8 -0.25 -3.3
  [4,15,-0.24,-0.25,-5.09,-0.1,-0.25,-5.01,0.52,-0.25,-4.3,-2.8,-0.25,-3.3],
// 3 15 -2.8 -0.25 -3.07 -2.8 -0.25 -3.3 0.52 -0.25 -4.3
  [3,15,-2.8,-0.25,-3.07,-2.8,-0.25,-3.3,0.52,-0.25,-4.3],
// 4 15 -3.4 -0.25 -2.28 -2.8 -0.25 -3.07 0.52 -0.25 -4.3 0.97 -0.25 -0.92
  [4,15,-3.4,-0.25,-2.28,-2.8,-0.25,-3.07,0.52,-0.25,-4.3,0.97,-0.25,-0.92],
// 4 15 -4.88 -0.25 -3.07 -2.8 -0.25 -3.07 -3.4 -0.25 -2.28 -4.88 -0.25 -2.28
  [4,15,-4.88,-0.25,-3.07,-2.8,-0.25,-3.07,-3.4,-0.25,-2.28,-4.88,-0.25,-2.28],
// 3 15 1.03 -0.25 -1.03 2.52 -0.25 -3.07 2.6 -0.25 -3.07
  [3,15,1.03,-0.25,-1.03,2.52,-0.25,-3.07,2.6,-0.25,-3.07],
// 3 15 0.52 -0.25 -4.3 2.52 -0.25 -3.07 1.03 -0.25 -1.03
  [3,15,0.52,-0.25,-4.3,2.52,-0.25,-3.07,1.03,-0.25,-1.03],
// 3 15 0.52 -0.25 -4.3 1.03 -0.25 -1.03 0.97 -0.25 -0.92
  [3,15,0.52,-0.25,-4.3,1.03,-0.25,-1.03,0.97,-0.25,-0.92],
// 4 15 -3.4 -0.25 -2.1 -3.4 -0.25 -2.28 0.97 -0.25 -0.92 1.06 -0.25 -0.48
  [4,15,-3.4,-0.25,-2.1,-3.4,-0.25,-2.28,0.97,-0.25,-0.92,1.06,-0.25,-0.48],
// 4 15 -3.78 -0.25 -1.85 -3.4 -0.25 -2.1 1.06 -0.25 -0.48 -4.41 -0.25 -0.92
  [4,15,-3.78,-0.25,-1.85,-3.4,-0.25,-2.1,1.06,-0.25,-0.48,-4.41,-0.25,-0.92],
// 4 15 -4.53 -0.25 -0.35 -4.41 -0.25 -0.92 1.06 -0.25 -0.48 -4.59 -0.25 0.42
  [4,15,-4.53,-0.25,-0.35,-4.41,-0.25,-0.92,1.06,-0.25,-0.48,-4.59,-0.25,0.42],
// 4 15 -4.88 -0.25 -0.35 -4.53 -0.25 -0.35 -4.59 -0.25 0.42 -4.88 -0.25 0.42
  [4,15,-4.88,-0.25,-0.35,-4.53,-0.25,-0.35,-4.59,-0.25,0.42,-4.88,-0.25,0.42],
// 4 15 -4.41 -0.25 1.28 -4.59 -0.25 0.42 1.06 -0.25 -0.48 1.72 -0.25 -0.48
  [4,15,-4.41,-0.25,1.28,-4.59,-0.25,0.42,1.06,-0.25,-0.48,1.72,-0.25,-0.48],
// 3 15 -4.41 -0.25 1.28 1.72 -0.25 -0.48 1.15 -0.25 0.42
  [3,15,-4.41,-0.25,1.28,1.72,-0.25,-0.48,1.15,-0.25,0.42],
// 3 15 1.15 -0.25 0.42 1.72 -0.25 -0.48 2.6 -0.25 0.42
  [3,15,1.15,-0.25,0.42,1.72,-0.25,-0.48,2.6,-0.25,0.42],
// 4 15 -4.41 -0.25 1.28 1.15 -0.25 0.42 0.97 -0.25 1.28 -3.78 -0.25 2.21
  [4,15,-4.41,-0.25,1.28,1.15,-0.25,0.42,0.97,-0.25,1.28,-3.78,-0.25,2.21],
// 4 15 -3.53 -0.25 2.38 -3.78 -0.25 2.21 0.97 -0.25 1.28 0.52 -0.25 1.95
  [4,15,-3.53,-0.25,2.38,-3.78,-0.25,2.21,0.97,-0.25,1.28,0.52,-0.25,1.95],
// 4 15 -3.53 -0.25 2.38 0.52 -0.25 1.95 0.52 -0.25 2.38 -0.1 -0.25 3.13
  [4,15,-3.53,-0.25,2.38,0.52,-0.25,1.95,0.52,-0.25,2.38,-0.1,-0.25,3.13],
// 3 15 -3.53 -0.25 2.38 -0.1 -0.25 3.13 -2.18 -0.25 3.13
  [3,15,-3.53,-0.25,2.38,-0.1,-0.25,3.13,-2.18,-0.25,3.13],
// 4 15 -3.53 -0.25 2.38 -2.18 -0.25 3.13 -2.8 -0.25 3.13 -4.88 -0.25 2.38
  [4,15,-3.53,-0.25,2.38,-2.18,-0.25,3.13,-2.8,-0.25,3.13,-4.88,-0.25,2.38],
// 3 15 -4.88 -0.25 3.13 -4.88 -0.25 2.38 -2.8 -0.25 3.13
  [3,15,-4.88,-0.25,3.13,-4.88,-0.25,2.38,-2.8,-0.25,3.13],
// 4 15 -4.88 -0.25 5.92 -4.88 -0.25 5.05 -2.8 -0.25 5.05 -2.8 -0.25 5.92
  [4,15,-4.88,-0.25,5.92,-4.88,-0.25,5.05,-2.8,-0.25,5.05,-2.8,-0.25,5.92],
// 4 15 -2.18 -0.25 5.92 -2.8 -0.25 5.92 -2.8 -0.25 5.05 -2.18 -0.25 5.05
  [4,15,-2.18,-0.25,5.92,-2.8,-0.25,5.92,-2.8,-0.25,5.05,-2.18,-0.25,5.05],
// 4 15 -2.8 -0.25 6.39 -2.8 -0.25 5.92 -2.18 -0.25 5.92 -2.18 -0.25 6.39
  [4,15,-2.8,-0.25,6.39,-2.8,-0.25,5.92,-2.18,-0.25,5.92,-2.18,-0.25,6.39],
// 4 15 -2.8 -0.25 5.05 -2.8 -0.25 3.13 -2.18 -0.25 3.13 -2.18 -0.25 5.05
  [4,15,-2.8,-0.25,5.05,-2.8,-0.25,3.13,-2.18,-0.25,3.13,-2.18,-0.25,5.05],
// 4 15 -2.18 -0.25 5.92 -2.18 -0.25 5.05 -0.1 -0.25 5.05 -0.1 -0.25 5.92
  [4,15,-2.18,-0.25,5.92,-2.18,-0.25,5.05,-0.1,-0.25,5.05,-0.1,-0.25,5.92],
// 4 15 0.52 -0.25 5.92 -0.1 -0.25 5.92 -0.1 -0.25 5.05 0.52 -0.25 5.05
  [4,15,0.52,-0.25,5.92,-0.1,-0.25,5.92,-0.1,-0.25,5.05,0.52,-0.25,5.05],
// 4 15 -0.1 -0.25 6.39 -0.1 -0.25 5.92 0.52 -0.25 5.92 0.52 -0.25 6.39
  [4,15,-0.1,-0.25,6.39,-0.1,-0.25,5.92,0.52,-0.25,5.92,0.52,-0.25,6.39],
// 4 15 0.52 -0.25 2.38 1.69 -0.25 2.38 1.48 -0.25 3.13 0.52 -0.25 3.13
  [4,15,0.52,-0.25,2.38,1.69,-0.25,2.38,1.48,-0.25,3.13,0.52,-0.25,3.13],
// 3 15 -0.1 -0.25 3.13 0.52 -0.25 2.38 0.52 -0.25 3.13
  [3,15,-0.1,-0.25,3.13,0.52,-0.25,2.38,0.52,-0.25,3.13],
// 4 15 -0.1 -0.25 3.13 0.52 -0.25 3.13 0.52 -0.25 5.05 -0.1 -0.25 5.05
  [4,15,-0.1,-0.25,3.13,0.52,-0.25,3.13,0.52,-0.25,5.05,-0.1,-0.25,5.05],
// 4 15 0.52 -0.25 5.92 0.52 -0.25 5.05 2.52 -0.25 5.05 2.6 -0.25 5.92
  [4,15,0.52,-0.25,5.92,0.52,-0.25,5.05,2.52,-0.25,5.05,2.6,-0.25,5.92],
// 4 15 3.22 -0.25 5.92 2.6 -0.25 5.92 2.52 -0.25 5.05 4.03 -0.25 1.98
  [4,15,3.22,-0.25,5.92,2.6,-0.25,5.92,2.52,-0.25,5.05,4.03,-0.25,1.98],
// 4 15 2.6 -0.25 6.39 2.6 -0.25 5.92 3.22 -0.25 5.92 3.22 -0.25 6.39
  [4,15,2.6,-0.25,6.39,2.6,-0.25,5.92,3.22,-0.25,5.92,3.22,-0.25,6.39],
// 4 15 2.6 -0.25 0.42 3.22 -0.25 0.8 3.22 -0.25 1.64 2.6 -0.25 1.68
  [4,15,2.6,-0.25,0.42,3.22,-0.25,0.8,3.22,-0.25,1.64,2.6,-0.25,1.68],
// 4 15 2.6 -0.25 1.68 3.22 -0.25 1.64 2.51 -0.25 4.98 2.43 -0.25 4.97
  [4,15,2.6,-0.25,1.68,3.22,-0.25,1.64,2.51,-0.25,4.98,2.43,-0.25,4.97],
// 4 15 2.46 -0.25 1.7 2.6 -0.25 1.68 2.43 -0.25 4.97 1.99 -0.25 1.98
  [4,15,2.46,-0.25,1.7,2.6,-0.25,1.68,2.43,-0.25,4.97,1.99,-0.25,1.98],
// 4 15 1.69 -0.25 2.38 1.99 -0.25 1.98 2.43 -0.25 4.97 1.89 -0.25 4.63
  [4,15,1.69,-0.25,2.38,1.99,-0.25,1.98,2.43,-0.25,4.97,1.89,-0.25,4.63],
// 4 15 1.69 -0.25 2.38 1.89 -0.25 4.63 1.52 -0.25 4.11 1.48 -0.25 3.13
  [4,15,1.69,-0.25,2.38,1.89,-0.25,4.63,1.52,-0.25,4.11,1.48,-0.25,3.13],
// 3 15 1.39 -0.25 3.51 1.48 -0.25 3.13 1.52 -0.25 4.11
  [3,15,1.39,-0.25,3.51,1.48,-0.25,3.13,1.52,-0.25,4.11],
// 4 15 2.51 -0.25 4.98 3.22 -0.25 1.64 3.56 -0.25 1.7 4.03 -0.25 1.98
  [4,15,2.51,-0.25,4.98,3.22,-0.25,1.64,3.56,-0.25,1.7,4.03,-0.25,1.98],
// 3 15 2.51 -0.25 4.98 4.03 -0.25 1.98 2.52 -0.25 5.05
  [3,15,2.51,-0.25,4.98,4.03,-0.25,1.98,2.52,-0.25,5.05],
// 4 15 3.91 -0.25 4.84 3.22 -0.25 5.92 4.03 -0.25 1.98 4.66 -0.25 3.13
  [4,15,3.91,-0.25,4.84,3.22,-0.25,5.92,4.03,-0.25,1.98,4.66,-0.25,3.13],
// 3 15 3.22 -0.25 5.92 3.91 -0.25 4.84 3.91 -0.25 5.05
  [3,15,3.22,-0.25,5.92,3.91,-0.25,4.84,3.91,-0.25,5.05],
// 4 15 3.22 -0.25 5.92 3.91 -0.25 5.05 5.3 -0.25 5.05 5.3 -0.25 5.92
  [4,15,3.22,-0.25,5.92,3.91,-0.25,5.05,5.3,-0.25,5.05,5.3,-0.25,5.92],
// 4 15 4.34 -0.25 2.39 5.14 -0.25 2.38 5.3 -0.25 3.13 4.66 -0.25 3.13
  [4,15,4.34,-0.25,2.39,5.14,-0.25,2.38,5.3,-0.25,3.13,4.66,-0.25,3.13],
// 3 15 4.03 -0.25 1.98 4.34 -0.25 2.39 4.66 -0.25 3.13
  [3,15,4.03,-0.25,1.98,4.34,-0.25,2.39,4.66,-0.25,3.13],
// 4 15 4.25 -0.25 4.63 3.91 -0.25 4.84 4.66 -0.25 3.13 4.75 -0.25 3.51
  [4,15,4.25,-0.25,4.63,3.91,-0.25,4.84,4.66,-0.25,3.13,4.75,-0.25,3.51],
// 3 15 4.25 -0.25 4.63 4.75 -0.25 3.51 4.62 -0.25 4.11
  [3,15,4.25,-0.25,4.63,4.75,-0.25,3.51,4.62,-0.25,4.11],
// 4 0 -8.8 -0.25 -8.8 -7.15 -0.25 -6.32 -7.15 -0.25 6.32 -8.8 -0.25 8.8
  [4,0,-8.8,-0.25,-8.8,-7.15,-0.25,-6.32,-7.15,-0.25,6.32,-8.8,-0.25,8.8],
// 4 0 8.8 -0.25 -8.8 8.8 -0.25 8.8 7.15 -0.25 6.32 7.15 -0.25 -6.32
  [4,0,8.8,-0.25,-8.8,8.8,-0.25,8.8,7.15,-0.25,6.32,7.15,-0.25,-6.32],
];
module ldraw_lib__168365d(step=0, col=false, unit=2/5, alt=false, line=0.2, solid=!$preview)
    makepoly(ldraw_lib__168365d(), step=step, col=col, unit=unit, alt=alt, line=line, solid=solid);
ldraw_lib__168365d(line=0.2);
